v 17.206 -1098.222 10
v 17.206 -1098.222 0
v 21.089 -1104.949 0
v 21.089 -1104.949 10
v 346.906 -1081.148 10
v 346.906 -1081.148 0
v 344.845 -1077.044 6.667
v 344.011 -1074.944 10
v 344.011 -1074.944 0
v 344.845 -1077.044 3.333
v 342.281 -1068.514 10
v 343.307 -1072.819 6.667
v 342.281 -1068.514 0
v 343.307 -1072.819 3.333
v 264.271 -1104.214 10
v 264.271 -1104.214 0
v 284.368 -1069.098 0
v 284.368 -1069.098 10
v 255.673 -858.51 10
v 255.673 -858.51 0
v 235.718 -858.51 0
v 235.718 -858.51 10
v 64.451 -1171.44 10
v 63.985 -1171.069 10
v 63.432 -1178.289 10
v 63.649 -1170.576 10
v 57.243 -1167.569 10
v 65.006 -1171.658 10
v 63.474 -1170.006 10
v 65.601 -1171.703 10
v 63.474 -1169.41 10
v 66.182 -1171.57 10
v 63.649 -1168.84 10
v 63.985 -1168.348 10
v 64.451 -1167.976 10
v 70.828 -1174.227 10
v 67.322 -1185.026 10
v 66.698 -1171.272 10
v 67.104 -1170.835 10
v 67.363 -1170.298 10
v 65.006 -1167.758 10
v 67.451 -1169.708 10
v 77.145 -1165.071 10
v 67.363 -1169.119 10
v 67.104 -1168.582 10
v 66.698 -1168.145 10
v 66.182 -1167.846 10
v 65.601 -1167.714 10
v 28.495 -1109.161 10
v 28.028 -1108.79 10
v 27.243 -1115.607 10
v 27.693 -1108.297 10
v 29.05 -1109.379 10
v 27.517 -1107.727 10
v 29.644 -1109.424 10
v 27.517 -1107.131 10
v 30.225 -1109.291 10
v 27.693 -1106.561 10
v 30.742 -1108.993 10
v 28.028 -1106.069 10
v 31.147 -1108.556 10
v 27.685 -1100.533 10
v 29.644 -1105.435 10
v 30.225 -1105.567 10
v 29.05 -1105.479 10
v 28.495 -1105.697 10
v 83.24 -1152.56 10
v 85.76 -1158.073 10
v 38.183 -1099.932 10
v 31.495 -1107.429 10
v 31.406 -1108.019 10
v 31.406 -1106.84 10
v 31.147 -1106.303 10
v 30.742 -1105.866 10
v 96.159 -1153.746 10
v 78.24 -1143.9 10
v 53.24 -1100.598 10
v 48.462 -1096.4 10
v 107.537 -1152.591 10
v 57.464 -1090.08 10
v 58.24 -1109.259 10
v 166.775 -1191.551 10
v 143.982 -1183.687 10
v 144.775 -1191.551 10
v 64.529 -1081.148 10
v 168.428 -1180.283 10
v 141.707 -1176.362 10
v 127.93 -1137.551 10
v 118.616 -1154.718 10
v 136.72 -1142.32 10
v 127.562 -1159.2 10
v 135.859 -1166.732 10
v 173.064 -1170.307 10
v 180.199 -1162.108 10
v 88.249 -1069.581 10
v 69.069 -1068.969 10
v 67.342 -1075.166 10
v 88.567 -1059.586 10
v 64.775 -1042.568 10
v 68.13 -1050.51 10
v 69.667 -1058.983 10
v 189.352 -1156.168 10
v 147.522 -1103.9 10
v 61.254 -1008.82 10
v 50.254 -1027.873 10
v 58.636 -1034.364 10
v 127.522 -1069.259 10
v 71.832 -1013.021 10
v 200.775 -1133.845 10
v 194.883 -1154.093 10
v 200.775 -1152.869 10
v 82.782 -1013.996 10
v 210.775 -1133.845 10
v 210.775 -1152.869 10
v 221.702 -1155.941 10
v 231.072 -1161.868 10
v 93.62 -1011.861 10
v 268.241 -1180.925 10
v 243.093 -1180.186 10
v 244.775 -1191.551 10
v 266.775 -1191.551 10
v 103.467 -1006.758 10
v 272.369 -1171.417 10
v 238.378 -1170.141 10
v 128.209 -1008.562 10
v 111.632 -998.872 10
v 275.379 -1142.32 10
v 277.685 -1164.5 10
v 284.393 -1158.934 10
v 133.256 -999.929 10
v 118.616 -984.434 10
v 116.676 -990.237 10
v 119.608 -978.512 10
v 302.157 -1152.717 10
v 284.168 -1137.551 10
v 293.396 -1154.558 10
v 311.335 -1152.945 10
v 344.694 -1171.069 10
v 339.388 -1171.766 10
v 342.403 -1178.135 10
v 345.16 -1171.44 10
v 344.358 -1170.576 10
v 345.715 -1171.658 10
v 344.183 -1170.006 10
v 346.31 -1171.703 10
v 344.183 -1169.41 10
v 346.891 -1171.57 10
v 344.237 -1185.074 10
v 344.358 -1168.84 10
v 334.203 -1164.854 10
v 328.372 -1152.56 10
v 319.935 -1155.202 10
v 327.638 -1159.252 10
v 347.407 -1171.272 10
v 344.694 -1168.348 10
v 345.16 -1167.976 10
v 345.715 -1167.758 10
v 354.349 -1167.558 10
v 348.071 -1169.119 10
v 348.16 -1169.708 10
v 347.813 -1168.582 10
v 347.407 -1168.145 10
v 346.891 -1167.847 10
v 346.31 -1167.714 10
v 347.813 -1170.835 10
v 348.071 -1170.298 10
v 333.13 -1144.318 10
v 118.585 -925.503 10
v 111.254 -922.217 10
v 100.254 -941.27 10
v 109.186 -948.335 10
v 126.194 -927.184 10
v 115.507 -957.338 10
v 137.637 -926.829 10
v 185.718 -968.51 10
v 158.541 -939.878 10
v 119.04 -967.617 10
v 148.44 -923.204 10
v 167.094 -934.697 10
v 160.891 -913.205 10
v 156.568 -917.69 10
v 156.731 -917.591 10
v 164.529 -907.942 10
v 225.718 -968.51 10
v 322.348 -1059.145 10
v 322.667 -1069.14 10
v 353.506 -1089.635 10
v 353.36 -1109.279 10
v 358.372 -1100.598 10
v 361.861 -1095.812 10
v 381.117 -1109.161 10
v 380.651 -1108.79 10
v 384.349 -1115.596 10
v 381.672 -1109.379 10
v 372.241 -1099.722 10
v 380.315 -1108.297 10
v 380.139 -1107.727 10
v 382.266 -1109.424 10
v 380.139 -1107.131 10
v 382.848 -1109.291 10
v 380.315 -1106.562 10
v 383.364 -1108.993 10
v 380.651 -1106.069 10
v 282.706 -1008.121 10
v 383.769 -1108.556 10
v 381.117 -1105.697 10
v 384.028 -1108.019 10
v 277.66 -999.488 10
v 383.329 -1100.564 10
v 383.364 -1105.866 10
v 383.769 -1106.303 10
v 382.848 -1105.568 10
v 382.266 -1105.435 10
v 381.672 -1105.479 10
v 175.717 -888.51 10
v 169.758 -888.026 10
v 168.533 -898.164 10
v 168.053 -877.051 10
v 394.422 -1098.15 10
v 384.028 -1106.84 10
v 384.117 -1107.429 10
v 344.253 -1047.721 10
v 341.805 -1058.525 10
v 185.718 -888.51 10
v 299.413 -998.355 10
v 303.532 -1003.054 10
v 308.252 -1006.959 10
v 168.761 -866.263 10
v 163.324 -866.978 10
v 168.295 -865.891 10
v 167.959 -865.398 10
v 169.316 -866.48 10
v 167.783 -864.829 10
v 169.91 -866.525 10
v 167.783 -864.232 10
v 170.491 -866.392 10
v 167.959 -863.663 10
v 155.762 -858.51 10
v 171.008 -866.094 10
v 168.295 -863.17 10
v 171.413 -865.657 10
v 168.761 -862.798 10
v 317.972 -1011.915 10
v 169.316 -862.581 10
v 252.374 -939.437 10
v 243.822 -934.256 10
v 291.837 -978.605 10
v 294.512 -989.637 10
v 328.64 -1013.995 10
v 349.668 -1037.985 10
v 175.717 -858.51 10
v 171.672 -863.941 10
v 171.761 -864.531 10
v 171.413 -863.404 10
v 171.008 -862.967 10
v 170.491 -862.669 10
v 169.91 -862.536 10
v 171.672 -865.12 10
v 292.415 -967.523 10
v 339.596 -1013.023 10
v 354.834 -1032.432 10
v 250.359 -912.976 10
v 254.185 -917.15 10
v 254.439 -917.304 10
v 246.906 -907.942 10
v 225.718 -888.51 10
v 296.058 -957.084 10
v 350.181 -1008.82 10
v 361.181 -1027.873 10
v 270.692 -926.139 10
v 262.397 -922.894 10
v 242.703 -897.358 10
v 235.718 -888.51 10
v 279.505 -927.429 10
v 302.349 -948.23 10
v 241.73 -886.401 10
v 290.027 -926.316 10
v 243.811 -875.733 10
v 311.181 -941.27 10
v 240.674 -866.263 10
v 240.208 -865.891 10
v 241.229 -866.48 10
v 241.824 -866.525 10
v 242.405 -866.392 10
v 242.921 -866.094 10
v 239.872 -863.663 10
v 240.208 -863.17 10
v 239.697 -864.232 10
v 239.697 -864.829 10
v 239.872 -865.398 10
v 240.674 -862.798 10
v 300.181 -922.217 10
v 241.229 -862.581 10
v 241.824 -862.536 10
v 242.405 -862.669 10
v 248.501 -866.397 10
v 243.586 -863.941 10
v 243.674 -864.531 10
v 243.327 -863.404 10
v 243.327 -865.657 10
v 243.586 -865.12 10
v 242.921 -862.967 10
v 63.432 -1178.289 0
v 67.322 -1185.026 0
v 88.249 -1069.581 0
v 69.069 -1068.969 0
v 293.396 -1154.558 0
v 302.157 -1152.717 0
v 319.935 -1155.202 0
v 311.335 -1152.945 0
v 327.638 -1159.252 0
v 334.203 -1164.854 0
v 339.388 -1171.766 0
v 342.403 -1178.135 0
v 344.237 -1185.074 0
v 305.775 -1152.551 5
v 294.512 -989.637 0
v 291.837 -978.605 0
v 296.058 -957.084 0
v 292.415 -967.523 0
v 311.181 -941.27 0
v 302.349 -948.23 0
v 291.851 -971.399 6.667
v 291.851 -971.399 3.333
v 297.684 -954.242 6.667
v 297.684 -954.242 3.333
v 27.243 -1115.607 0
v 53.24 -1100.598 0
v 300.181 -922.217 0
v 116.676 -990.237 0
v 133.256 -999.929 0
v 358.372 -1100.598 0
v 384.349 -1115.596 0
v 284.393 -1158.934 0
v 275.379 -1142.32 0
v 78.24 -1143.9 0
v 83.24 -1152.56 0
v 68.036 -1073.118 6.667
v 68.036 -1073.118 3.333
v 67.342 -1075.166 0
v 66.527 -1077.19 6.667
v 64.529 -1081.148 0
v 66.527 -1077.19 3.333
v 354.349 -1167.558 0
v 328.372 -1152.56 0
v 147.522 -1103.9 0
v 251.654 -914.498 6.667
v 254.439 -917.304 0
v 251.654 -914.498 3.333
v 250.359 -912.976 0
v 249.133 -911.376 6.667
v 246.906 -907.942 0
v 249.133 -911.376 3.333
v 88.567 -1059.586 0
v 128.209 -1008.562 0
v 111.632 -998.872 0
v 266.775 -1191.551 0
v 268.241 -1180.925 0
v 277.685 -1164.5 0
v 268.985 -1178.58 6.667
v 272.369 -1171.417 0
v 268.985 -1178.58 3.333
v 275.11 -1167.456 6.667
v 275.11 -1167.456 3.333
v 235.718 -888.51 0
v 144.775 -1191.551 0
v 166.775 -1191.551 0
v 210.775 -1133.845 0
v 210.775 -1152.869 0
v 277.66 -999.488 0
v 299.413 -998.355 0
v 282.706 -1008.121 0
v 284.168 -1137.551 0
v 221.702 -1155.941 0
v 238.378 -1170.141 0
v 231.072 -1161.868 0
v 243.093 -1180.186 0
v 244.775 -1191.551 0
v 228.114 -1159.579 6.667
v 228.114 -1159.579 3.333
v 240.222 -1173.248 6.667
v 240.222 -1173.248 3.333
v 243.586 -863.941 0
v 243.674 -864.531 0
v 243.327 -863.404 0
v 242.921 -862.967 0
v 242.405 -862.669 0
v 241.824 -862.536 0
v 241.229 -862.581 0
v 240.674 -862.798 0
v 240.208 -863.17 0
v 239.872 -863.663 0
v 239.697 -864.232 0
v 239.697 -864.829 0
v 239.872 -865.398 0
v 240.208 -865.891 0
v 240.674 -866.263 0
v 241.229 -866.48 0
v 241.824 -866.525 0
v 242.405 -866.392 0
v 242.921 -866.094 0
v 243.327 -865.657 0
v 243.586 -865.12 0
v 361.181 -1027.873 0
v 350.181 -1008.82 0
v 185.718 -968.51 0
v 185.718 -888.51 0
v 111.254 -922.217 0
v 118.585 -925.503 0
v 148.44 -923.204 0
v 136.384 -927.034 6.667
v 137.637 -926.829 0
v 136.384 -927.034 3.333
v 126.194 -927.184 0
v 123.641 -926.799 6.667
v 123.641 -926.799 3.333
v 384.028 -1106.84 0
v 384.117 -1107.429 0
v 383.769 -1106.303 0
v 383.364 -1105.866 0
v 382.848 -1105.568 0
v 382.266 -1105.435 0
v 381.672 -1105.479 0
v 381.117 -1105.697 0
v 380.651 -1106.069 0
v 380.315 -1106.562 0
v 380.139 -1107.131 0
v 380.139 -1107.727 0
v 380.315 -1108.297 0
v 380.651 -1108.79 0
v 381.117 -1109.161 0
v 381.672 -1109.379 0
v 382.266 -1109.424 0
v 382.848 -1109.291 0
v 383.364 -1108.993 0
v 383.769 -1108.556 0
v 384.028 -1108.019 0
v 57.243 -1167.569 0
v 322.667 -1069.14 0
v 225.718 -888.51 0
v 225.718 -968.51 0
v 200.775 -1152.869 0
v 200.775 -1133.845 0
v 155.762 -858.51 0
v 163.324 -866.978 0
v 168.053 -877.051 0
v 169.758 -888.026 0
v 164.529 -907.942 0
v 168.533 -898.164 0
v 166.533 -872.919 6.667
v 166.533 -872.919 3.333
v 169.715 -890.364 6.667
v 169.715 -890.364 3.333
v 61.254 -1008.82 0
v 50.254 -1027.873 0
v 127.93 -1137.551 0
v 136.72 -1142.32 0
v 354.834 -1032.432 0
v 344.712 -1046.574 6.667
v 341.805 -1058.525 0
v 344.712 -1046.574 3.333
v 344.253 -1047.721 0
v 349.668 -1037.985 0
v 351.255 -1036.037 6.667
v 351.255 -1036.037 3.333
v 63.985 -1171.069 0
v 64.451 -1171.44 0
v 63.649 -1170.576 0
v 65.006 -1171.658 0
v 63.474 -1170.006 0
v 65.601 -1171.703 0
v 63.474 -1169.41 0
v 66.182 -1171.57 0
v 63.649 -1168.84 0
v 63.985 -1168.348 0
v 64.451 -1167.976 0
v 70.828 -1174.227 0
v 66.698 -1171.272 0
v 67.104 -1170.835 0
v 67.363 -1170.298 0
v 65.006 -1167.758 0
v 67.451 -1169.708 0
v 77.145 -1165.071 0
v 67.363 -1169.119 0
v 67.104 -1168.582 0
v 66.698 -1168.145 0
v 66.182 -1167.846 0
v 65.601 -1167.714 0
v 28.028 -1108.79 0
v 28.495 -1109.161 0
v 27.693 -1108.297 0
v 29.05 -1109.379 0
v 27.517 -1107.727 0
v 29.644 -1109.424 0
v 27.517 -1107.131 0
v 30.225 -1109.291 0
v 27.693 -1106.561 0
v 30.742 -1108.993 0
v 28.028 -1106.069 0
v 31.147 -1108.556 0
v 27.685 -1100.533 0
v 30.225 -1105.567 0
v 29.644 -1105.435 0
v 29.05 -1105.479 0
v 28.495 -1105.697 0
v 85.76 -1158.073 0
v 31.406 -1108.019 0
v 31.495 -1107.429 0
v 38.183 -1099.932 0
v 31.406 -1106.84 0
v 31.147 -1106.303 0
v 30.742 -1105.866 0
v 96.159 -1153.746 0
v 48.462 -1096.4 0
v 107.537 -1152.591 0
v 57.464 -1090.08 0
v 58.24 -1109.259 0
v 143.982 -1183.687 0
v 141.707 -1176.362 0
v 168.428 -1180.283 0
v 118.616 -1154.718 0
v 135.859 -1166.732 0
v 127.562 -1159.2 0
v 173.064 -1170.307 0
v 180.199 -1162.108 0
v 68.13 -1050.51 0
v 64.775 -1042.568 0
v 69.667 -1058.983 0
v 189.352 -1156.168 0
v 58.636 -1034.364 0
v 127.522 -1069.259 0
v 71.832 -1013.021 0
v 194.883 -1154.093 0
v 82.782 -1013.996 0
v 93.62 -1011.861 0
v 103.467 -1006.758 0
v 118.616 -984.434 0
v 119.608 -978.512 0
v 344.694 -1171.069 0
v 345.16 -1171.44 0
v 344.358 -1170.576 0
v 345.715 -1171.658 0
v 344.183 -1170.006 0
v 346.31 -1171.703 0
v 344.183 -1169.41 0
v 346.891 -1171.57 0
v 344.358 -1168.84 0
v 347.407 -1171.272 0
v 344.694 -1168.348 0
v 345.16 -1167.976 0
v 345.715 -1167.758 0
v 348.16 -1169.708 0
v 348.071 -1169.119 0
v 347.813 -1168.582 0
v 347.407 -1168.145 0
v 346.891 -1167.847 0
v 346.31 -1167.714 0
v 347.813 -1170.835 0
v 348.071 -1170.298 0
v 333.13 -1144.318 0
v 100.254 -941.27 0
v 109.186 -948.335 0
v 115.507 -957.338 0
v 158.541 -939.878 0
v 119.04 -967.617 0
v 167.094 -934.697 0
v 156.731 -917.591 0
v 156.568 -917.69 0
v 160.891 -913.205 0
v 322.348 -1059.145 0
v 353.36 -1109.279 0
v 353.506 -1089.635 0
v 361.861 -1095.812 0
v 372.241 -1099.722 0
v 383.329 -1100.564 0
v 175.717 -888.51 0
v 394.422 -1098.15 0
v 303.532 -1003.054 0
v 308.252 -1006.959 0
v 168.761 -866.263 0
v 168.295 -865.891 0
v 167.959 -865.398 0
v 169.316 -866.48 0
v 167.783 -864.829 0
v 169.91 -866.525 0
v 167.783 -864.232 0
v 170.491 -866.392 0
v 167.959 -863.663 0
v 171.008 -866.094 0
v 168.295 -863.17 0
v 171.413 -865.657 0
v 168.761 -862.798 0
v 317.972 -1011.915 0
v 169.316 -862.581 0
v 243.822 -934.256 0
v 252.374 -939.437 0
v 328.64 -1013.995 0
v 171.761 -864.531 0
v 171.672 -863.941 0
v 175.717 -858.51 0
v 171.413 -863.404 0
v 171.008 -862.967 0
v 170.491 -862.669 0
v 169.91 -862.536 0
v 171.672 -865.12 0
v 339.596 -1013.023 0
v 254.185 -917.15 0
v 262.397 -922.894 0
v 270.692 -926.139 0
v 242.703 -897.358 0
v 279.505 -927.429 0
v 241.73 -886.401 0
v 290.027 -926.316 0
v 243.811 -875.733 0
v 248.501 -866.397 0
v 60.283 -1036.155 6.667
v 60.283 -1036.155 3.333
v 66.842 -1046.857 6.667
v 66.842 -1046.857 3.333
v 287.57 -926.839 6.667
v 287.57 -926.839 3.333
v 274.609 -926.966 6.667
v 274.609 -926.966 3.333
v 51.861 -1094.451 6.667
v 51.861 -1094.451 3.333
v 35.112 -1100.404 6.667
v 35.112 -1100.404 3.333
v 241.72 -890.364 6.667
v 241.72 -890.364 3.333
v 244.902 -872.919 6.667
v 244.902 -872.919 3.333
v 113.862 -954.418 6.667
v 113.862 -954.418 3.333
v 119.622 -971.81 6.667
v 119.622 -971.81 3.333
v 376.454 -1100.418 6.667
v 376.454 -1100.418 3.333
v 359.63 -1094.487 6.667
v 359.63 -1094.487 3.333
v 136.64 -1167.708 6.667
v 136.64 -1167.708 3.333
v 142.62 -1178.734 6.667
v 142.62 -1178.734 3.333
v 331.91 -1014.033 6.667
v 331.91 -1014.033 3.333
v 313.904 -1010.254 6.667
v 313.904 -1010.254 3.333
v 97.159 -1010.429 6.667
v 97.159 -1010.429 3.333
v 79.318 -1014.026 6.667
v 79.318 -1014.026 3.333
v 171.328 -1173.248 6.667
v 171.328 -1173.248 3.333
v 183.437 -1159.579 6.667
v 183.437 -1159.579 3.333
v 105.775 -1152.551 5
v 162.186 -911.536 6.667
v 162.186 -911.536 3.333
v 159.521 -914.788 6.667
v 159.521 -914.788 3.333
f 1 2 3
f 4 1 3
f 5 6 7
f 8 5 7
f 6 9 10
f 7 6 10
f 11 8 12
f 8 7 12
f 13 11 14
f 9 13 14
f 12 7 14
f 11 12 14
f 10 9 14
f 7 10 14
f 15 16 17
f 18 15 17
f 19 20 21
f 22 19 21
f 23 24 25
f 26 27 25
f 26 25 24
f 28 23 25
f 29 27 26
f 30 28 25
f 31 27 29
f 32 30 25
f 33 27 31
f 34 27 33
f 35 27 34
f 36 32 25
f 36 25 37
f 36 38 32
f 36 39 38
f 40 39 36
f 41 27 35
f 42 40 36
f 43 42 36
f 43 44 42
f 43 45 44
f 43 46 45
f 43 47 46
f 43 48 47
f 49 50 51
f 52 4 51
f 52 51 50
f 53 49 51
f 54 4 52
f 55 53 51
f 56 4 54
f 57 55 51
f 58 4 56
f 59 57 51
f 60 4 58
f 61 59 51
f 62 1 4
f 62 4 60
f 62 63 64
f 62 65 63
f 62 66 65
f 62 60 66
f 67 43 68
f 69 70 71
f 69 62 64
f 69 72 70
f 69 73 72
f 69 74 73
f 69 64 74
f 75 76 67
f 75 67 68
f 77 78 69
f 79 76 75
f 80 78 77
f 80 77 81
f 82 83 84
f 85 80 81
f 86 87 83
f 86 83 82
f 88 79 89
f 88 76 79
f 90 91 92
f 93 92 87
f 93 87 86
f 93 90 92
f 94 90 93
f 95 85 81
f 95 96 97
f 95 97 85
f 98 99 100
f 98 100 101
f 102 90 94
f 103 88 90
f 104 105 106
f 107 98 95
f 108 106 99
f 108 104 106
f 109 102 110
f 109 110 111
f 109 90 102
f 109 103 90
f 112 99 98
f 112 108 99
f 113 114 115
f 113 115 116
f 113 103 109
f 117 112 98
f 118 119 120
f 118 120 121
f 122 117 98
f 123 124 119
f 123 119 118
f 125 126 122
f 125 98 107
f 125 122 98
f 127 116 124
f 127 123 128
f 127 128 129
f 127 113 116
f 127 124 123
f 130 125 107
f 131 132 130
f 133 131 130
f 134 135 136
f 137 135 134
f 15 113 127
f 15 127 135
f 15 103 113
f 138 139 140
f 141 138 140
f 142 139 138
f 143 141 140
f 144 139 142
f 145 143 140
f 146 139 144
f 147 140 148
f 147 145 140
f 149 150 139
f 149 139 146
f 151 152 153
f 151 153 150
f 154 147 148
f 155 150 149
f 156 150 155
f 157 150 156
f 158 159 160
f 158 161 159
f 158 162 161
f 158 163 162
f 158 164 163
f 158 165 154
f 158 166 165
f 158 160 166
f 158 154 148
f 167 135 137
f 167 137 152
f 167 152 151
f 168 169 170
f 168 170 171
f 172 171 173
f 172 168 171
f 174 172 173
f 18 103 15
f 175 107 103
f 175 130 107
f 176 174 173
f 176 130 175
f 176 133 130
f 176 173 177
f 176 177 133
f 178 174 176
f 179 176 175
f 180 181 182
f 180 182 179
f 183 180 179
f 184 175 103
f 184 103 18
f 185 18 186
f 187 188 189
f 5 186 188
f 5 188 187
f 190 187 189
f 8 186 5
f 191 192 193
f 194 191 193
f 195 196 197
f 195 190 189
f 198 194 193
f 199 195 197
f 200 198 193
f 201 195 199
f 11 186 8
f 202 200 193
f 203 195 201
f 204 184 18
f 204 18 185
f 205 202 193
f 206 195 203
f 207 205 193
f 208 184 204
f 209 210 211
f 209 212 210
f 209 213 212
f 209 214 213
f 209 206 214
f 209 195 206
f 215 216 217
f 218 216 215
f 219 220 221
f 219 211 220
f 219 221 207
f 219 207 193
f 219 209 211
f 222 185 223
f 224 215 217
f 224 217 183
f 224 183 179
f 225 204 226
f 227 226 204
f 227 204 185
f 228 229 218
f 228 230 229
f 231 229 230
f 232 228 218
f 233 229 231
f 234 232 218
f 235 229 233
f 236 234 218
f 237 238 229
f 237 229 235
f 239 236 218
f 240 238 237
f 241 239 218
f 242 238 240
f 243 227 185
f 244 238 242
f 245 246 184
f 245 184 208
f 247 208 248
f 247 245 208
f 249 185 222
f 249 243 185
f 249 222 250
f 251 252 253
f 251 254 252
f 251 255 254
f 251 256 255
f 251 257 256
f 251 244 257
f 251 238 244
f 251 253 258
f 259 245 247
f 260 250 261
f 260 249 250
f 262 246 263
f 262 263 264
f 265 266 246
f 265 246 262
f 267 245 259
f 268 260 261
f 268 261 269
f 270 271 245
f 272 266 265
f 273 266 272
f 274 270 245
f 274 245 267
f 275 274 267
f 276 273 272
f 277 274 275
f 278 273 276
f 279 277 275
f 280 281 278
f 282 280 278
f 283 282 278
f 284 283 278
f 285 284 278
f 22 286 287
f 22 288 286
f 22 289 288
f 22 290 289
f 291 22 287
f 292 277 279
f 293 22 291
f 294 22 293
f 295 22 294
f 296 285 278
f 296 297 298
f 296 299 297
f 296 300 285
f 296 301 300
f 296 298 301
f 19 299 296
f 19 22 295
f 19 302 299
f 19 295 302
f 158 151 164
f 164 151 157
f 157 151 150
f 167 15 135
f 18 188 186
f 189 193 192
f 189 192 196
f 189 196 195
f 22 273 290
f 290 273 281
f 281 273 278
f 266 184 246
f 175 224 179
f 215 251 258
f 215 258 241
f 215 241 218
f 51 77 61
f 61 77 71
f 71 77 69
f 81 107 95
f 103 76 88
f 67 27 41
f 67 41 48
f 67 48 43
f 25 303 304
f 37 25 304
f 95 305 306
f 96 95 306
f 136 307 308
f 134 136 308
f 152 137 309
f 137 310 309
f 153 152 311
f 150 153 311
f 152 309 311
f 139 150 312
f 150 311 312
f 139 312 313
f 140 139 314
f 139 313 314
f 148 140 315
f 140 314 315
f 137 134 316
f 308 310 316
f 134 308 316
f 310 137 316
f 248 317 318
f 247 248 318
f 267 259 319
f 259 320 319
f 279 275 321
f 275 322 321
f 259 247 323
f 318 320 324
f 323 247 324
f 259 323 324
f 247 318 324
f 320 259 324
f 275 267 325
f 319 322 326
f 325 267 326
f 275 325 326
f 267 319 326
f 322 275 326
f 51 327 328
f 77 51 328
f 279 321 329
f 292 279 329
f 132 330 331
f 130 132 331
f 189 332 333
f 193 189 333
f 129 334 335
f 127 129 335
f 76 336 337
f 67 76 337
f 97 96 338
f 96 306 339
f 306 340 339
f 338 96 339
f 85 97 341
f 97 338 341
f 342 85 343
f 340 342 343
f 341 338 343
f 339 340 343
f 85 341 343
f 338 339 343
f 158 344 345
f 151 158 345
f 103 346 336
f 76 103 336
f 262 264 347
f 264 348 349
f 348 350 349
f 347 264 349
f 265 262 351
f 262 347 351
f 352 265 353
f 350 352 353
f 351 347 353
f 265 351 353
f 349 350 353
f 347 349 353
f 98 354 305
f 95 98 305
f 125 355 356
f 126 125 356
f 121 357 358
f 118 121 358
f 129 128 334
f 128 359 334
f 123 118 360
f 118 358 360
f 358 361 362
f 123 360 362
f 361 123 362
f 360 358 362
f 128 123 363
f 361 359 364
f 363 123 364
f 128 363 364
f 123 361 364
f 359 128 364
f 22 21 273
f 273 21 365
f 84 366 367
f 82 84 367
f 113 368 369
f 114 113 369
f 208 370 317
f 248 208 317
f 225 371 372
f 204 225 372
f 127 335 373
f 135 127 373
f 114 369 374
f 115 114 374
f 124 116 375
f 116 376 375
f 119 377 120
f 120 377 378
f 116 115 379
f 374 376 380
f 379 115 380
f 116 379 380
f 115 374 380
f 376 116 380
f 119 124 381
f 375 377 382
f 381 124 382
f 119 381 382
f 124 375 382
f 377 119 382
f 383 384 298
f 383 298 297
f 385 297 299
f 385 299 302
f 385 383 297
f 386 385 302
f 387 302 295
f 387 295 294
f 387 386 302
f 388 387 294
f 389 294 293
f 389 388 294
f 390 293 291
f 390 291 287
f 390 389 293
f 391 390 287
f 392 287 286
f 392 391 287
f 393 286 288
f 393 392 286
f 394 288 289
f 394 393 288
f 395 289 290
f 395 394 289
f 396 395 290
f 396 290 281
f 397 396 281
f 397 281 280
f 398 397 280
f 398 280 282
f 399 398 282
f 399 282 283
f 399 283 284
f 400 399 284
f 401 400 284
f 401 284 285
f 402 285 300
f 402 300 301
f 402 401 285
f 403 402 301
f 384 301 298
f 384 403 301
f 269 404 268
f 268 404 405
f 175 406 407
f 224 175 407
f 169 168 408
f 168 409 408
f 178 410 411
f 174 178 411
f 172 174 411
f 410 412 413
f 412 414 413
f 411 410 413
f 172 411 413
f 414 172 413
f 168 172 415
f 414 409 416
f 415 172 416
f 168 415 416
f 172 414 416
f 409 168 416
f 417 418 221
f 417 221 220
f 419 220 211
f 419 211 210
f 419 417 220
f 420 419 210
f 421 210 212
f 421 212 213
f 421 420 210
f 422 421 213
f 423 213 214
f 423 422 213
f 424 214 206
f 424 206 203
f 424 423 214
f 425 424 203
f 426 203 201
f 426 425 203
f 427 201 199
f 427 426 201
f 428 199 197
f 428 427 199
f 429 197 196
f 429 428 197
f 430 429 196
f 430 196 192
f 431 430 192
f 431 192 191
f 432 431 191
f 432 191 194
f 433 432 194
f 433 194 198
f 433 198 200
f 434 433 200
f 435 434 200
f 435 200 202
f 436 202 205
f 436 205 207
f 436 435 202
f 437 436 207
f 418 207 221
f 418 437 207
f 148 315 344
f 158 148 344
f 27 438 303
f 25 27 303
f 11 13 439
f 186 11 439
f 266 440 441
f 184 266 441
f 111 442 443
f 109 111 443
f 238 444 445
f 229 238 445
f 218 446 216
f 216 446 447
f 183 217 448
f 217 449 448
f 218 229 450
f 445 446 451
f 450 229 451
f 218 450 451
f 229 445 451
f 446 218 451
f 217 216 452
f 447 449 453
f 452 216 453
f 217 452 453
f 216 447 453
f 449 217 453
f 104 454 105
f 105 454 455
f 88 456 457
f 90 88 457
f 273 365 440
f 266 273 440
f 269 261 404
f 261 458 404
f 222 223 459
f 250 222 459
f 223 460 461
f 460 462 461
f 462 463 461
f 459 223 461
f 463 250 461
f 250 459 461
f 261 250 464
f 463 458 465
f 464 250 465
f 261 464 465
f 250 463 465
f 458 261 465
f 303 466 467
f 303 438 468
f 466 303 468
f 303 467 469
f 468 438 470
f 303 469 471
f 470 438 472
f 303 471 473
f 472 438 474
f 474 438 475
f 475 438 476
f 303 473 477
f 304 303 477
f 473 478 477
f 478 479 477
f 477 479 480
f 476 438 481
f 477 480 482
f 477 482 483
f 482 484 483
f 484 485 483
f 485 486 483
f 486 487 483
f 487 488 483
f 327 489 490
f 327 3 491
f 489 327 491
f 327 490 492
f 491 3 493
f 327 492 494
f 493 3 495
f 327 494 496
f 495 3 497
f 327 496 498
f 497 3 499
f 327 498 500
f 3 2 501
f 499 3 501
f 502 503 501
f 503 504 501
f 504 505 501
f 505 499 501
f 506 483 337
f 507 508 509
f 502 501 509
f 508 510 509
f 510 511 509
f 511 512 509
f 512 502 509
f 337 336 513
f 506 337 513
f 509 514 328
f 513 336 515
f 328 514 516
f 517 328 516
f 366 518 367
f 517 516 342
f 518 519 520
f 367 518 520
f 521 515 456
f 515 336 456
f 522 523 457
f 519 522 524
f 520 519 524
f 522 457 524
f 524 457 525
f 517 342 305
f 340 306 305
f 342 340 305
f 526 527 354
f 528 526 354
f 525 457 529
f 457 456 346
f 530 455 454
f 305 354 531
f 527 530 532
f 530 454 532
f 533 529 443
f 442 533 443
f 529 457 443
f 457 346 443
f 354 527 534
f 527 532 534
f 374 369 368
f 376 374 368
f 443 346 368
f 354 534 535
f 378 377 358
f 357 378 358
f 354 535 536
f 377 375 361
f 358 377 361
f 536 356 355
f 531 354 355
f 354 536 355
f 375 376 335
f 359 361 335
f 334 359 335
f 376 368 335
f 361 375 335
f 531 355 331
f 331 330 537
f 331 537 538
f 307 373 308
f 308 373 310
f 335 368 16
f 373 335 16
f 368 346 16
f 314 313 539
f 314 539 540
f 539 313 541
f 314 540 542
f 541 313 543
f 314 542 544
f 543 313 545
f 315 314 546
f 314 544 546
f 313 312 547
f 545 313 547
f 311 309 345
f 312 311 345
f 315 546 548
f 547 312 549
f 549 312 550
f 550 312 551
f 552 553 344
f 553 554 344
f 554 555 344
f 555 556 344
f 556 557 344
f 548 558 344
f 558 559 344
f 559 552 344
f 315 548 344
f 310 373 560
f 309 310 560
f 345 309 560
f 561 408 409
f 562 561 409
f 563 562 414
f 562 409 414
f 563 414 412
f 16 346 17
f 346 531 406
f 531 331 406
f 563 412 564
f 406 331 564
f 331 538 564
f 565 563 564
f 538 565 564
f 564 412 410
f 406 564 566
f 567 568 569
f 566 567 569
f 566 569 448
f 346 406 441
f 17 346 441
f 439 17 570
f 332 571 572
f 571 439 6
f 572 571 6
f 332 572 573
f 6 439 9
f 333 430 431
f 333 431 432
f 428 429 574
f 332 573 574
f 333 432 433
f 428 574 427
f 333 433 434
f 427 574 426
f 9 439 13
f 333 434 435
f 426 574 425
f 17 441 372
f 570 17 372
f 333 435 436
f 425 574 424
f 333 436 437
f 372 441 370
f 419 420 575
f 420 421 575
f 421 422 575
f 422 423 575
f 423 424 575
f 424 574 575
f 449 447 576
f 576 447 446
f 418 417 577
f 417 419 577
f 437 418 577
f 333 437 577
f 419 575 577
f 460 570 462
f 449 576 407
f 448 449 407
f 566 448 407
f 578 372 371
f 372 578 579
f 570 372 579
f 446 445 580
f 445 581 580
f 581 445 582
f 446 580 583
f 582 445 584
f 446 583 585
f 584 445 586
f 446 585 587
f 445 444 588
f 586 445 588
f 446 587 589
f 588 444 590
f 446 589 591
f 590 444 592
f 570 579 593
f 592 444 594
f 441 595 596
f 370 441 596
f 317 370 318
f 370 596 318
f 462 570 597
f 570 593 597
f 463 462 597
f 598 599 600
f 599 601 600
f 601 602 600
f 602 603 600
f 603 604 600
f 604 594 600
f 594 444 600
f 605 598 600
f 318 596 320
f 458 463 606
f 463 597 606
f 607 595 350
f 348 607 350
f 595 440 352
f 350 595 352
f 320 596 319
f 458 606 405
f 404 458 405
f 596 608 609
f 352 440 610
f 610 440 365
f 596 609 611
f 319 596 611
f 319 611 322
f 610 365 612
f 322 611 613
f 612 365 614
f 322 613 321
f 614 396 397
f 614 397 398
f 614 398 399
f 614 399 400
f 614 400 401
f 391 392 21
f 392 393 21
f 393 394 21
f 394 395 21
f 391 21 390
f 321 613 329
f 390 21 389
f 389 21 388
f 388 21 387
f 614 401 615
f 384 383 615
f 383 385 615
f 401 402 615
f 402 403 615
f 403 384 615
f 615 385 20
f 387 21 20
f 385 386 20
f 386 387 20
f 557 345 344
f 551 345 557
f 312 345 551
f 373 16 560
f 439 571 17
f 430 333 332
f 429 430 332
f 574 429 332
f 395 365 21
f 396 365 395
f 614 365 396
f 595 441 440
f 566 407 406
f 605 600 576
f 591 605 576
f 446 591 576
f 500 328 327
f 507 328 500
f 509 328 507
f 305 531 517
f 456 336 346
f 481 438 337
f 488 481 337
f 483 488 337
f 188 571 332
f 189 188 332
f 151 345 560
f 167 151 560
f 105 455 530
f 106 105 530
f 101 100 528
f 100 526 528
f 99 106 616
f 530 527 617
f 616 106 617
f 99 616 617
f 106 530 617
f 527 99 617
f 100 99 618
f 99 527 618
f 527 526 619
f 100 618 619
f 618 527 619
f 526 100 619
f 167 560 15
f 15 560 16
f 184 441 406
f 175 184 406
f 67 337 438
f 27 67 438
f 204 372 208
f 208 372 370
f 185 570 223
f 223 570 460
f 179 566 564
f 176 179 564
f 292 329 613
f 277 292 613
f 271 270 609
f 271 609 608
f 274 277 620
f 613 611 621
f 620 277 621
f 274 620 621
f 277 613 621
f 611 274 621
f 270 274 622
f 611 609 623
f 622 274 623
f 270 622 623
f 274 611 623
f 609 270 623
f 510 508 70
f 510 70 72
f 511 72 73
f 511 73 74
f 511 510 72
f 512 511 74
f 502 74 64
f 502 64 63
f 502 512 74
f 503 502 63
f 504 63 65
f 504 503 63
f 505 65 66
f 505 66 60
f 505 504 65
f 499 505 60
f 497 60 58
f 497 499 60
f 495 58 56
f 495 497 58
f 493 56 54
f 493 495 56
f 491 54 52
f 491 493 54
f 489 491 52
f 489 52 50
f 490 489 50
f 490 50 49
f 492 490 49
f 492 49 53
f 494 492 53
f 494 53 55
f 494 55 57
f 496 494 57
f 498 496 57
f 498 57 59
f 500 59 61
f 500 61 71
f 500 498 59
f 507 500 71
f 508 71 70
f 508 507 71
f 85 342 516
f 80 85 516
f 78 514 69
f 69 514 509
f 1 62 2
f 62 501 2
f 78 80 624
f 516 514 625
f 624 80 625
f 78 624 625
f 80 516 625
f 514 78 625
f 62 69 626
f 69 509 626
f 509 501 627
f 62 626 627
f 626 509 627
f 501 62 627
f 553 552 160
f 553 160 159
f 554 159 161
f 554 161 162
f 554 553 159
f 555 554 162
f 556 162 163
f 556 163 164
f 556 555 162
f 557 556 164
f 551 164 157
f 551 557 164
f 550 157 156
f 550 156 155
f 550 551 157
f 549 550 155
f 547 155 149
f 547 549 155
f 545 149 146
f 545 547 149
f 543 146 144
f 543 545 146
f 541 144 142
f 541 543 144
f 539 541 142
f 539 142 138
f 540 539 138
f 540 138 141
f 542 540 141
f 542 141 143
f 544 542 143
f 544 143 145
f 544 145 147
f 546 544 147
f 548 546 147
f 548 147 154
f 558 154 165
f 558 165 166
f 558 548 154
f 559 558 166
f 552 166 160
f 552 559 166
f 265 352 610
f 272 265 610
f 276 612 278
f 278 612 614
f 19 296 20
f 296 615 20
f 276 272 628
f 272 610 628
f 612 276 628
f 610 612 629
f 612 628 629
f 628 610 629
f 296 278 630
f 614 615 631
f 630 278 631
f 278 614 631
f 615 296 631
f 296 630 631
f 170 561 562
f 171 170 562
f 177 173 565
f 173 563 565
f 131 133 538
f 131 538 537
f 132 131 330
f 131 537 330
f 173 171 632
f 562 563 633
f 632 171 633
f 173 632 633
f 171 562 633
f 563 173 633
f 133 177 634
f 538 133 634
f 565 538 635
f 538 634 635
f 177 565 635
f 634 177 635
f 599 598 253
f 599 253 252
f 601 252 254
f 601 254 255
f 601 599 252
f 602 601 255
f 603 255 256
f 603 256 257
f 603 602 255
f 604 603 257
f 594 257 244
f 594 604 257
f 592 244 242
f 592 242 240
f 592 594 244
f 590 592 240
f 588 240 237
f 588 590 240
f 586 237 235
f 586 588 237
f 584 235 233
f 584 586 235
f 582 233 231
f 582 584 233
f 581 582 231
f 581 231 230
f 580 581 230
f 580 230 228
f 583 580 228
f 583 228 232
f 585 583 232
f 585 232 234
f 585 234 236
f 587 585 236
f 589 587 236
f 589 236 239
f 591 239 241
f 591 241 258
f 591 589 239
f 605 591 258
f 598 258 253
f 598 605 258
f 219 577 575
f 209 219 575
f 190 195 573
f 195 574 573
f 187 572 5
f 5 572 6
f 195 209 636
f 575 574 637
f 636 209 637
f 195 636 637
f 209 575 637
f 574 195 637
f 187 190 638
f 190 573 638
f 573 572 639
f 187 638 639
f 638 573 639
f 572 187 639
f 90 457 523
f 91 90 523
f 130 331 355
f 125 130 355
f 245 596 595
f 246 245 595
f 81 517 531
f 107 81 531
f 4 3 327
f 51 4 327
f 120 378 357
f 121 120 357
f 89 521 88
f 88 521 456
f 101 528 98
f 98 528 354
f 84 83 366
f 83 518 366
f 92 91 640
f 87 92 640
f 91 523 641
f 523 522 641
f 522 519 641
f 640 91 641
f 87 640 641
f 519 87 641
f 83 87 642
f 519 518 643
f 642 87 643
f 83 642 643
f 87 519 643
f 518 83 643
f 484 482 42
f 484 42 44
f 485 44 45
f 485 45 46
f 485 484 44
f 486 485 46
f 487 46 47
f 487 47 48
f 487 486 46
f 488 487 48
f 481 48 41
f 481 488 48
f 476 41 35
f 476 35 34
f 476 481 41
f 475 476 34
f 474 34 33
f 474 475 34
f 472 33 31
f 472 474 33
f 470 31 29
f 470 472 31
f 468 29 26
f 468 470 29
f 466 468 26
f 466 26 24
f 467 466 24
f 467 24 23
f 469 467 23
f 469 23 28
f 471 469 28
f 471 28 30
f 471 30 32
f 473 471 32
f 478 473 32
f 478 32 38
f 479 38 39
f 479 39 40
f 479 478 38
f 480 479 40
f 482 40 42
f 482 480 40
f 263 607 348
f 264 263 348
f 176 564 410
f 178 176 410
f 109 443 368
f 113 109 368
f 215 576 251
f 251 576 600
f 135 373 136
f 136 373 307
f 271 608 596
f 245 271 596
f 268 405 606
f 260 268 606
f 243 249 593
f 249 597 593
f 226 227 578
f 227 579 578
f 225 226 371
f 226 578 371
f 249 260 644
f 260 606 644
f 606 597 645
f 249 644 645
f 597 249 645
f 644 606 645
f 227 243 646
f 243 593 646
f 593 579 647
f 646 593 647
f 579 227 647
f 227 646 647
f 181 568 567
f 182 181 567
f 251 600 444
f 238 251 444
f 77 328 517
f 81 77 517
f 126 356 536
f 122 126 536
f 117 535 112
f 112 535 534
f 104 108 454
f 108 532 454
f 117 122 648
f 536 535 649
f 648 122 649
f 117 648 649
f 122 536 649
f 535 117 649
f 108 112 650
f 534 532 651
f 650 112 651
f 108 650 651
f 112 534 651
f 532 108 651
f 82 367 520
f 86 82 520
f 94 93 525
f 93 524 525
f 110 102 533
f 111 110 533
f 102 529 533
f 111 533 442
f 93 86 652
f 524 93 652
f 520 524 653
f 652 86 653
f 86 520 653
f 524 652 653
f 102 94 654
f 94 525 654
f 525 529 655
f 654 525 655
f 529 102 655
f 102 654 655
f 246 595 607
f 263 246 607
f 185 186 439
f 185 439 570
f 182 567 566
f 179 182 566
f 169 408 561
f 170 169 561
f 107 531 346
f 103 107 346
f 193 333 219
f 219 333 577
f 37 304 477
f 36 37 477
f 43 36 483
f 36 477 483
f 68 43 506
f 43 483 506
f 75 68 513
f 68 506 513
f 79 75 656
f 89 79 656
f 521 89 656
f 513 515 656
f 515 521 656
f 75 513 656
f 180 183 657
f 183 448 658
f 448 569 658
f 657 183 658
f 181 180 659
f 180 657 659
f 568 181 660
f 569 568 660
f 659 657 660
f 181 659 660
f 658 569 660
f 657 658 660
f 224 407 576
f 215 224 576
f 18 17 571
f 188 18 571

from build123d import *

# Parameters (mm, degrees)
MODEL_R            = 2
BOSS_EXTRU_1_DEPTH = 10


with BuildPart() as part:
    # Model → Boss.-Extru.1 (new body)
    with BuildSketch(Plane.XY):
        with BuildLine():
            Line((118.61641531, -1154.71765861), (127.930403211, -1137.550920057))
            Line((127.930403211, -1137.550920057), (136.72004758, -1142.319793484))
            Line((136.72004758, -1142.319793484), (127.561777994, -1159.199598646))
            add(Edge.make_bspline(
                [(127.561777994, -1159.199598646), (137.946329318, -1166.206535292), (144.775197591, -1178.081348795), (144.775197591, -1191.551327637)],
                knots=[5, 5, 5, 5, 6, 6, 6, 6], degree=3))
            Line((144.775197591, -1191.551327637), (166.775232855, -1191.551327637))
            add(Edge.make_bspline(
                [(166.775232855, -1191.551327637), (166.775232855, -1171.706328789), (181.59758393, -1155.323650906), (200.775224717, -1152.869278754)],
                knots=[7, 7, 7, 7, 8, 8, 8, 8], degree=3))
            Line((200.775224717, -1152.869278754), (200.775224717, -1133.844858588))
            Line((200.775224717, -1133.844858588), (210.775303385, -1133.844858588))
            Line((210.775303385, -1133.844858588), (210.775303385, -1152.869278754))
            add(Edge.make_bspline(
                [(210.775303385, -1152.869278754), (229.952944173, -1155.323650906), (244.775295247, -1171.706328789), (244.775295247, -1191.551327637)],
                knots=[11, 11, 11, 11, 12, 12, 12, 12], degree=3))
            Line((244.775295247, -1191.551327637), (266.775330512, -1191.551327637))
            add(Edge.make_bspline(
                [(266.775330512, -1191.551327637), (266.775330512, -1177.908060492), (273.782482476, -1165.903323825), (284.392859809, -1158.933637275)],
                knots=[13, 13, 13, 13, 14, 14, 14, 14], degree=3))
            Line((284.392859809, -1158.933637275), (275.378767469, -1142.319793484))
            Line((275.378767469, -1142.319793484), (284.168411838, -1137.550920057))
            Line((284.168411838, -1137.550920057), (293.396100097, -1154.558495198))
            add(Edge.make_bspline(
                [(293.396100097, -1154.558495198), (297.285612901, -1153.257454888), (301.447805013, -1152.551339504), (305.775189453, -1152.551339504)],
                knots=[17, 17, 17, 17, 18, 18, 18, 18], degree=3))
            add(Edge.make_bspline(
                [(305.775189453, -1152.551339504), (325.107170518, -1152.551339504), (341.150980197, -1166.618095011), (344.236752224, -1185.07381604)],
                knots=[18, 18, 18, 18, 19, 19, 19, 19], degree=3))
            Line((344.236752224, -1185.07381604), (354.349485514, -1167.558003187))
            Line((354.349485514, -1167.558003187), (328.371915256, -1152.559823052))
            Line((328.371915256, -1152.559823052), (333.130108886, -1144.318293375))
            Line((333.130108886, -1144.318293375), (264.271435112, -1104.214281331))
            Line((264.271435112, -1104.214281331), (284.368399631, -1069.09782015))
            Line((284.368399631, -1069.09782015), (353.359881836, -1109.279260715))
            Line((353.359881836, -1109.279260715), (358.371806749, -1100.598309109))
            Line((358.371806749, -1100.598309109), (384.349377007, -1115.59644618))
            Line((384.349377007, -1115.59644618), (394.422147189, -1098.149707492))
            add(Edge.make_bspline(
                [(394.422147189, -1098.149707492), (376.868524414, -1104.781903876), (356.593965223, -1097.927843343), (346.905839952, -1081.147558377)],
                knots=[28, 28, 28, 28, 29, 29, 29, 29], degree=3))
            add(Edge.make_bspline(
                [(346.905839952, -1081.147558377), (344.579194715, -1077.117744059), (343.055256727, -1072.845136637), (342.281143771, -1068.514393229)],
                knots=[29, 29, 29, 29, 30, 30, 30, 30], degree=3))
            Line((342.281143771, -1068.514393229), (322.666837131, -1069.139591932))
            Line((322.666837131, -1069.139591932), (322.348338053, -1059.144680908))
            Line((322.348338053, -1059.144680908), (341.805376085, -1058.524520657))
            add(Edge.make_bspline(
                [(341.805376085, -1058.524520657), (342.807554362, -1046.186987766), (349.649858507, -1034.529990424), (361.180765353, -1027.872601779)],
                knots=[33, 33, 33, 33, 34, 34, 34, 34], degree=3))
            Line((361.180765353, -1027.872601779), (350.180747721, -1008.820017958))
            add(Edge.make_bspline(
                [(350.180747721, -1008.820017958), (332.861563693, -1018.819235351), (311.063066514, -1014.022628906), (299.412959364, -998.355368164)],
                knots=[35, 35, 35, 35, 36, 36, 36, 36], degree=3))
            Line((299.412959364, -998.355368164), (282.706313313, -1008.121137275))
            Line((282.706313313, -1008.121137275), (277.659765191, -999.487900241))
            Line((277.659765191, -999.487900241), (294.51179427, -989.637209527))
            add(Edge.make_bspline(
                [(294.51179427, -989.637209527), (287.327047634, -971.892340888), (294.128699652, -951.115099202), (311.18088878, -941.270049832)],
                knots=[39, 39, 39, 39, 40, 40, 40, 40], degree=3))
            Line((311.18088878, -941.270049832), (300.180871148, -922.21746601))
            add(Edge.make_bspline(
                [(300.180871148, -922.21746601), (288.111668131, -929.185602268), (273.867231825, -928.967097086), (262.397130913, -922.893738254)],
                knots=[43, 43, 43, 43, 44, 44, 44, 44], degree=3))
            Line((262.397130913, -922.893738254), (252.374314615, -939.437259033))
            Line((252.374314615, -939.437259033), (243.821520562, -934.25557704))
            Line((243.821520562, -934.25557704), (254.184884548, -917.149988932))
            Line((254.184884548, -917.149988932), (254.43896034, -917.303898573))
            add(Edge.make_bspline(
                [(254.43896034, -917.303898573), (251.531472005, -914.659098768), (248.976244683, -911.528368245), (246.90591455, -907.942454481)],
                knots=[48, 48, 48, 48, 49, 49, 49, 49], degree=3))
            add(Edge.make_bspline(
                [(246.90591455, -907.942454481), (237.277044921, -891.265005615), (241.367579047, -870.433288357), (255.673338053, -858.509899007)],
                knots=[49, 49, 49, 49, 50, 50, 50, 50], degree=3))
            Line((255.673338053, -858.509899007), (247.962525336, -858.509899007))
            Line((247.962525336, -858.509899007), (235.71762245, -858.509899007))
            Line((235.71762245, -858.509899007), (235.71762245, -888.509876627))
            Line((235.71762245, -888.509876627), (225.717543782, -888.509876627))
            Line((225.717543782, -888.509876627), (225.717543782, -968.509903076))
            Line((225.717543782, -968.509903076), (185.717573622, -968.509903076))
            Line((185.717573622, -968.509903076), (185.717573622, -888.509876627))
            Line((185.717573622, -888.509876627), (175.717494954, -888.509876627))
            Line((175.717494954, -888.509876627), (175.717494954, -858.509899007))
            Line((175.717494954, -858.509899007), (163.472592068, -858.509899007))
            Line((163.472592068, -858.509899007), (155.761779351, -858.509899007))
            add(Edge.make_bspline(
                [(155.761779351, -858.509899007), (170.067538357, -870.433288357), (174.158072482, -891.265005615), (164.529202853, -907.942454481)],
                knots=[61, 61, 61, 61, 62, 62, 62, 62], degree=3))
            add(Edge.make_bspline(
                [(164.529202853, -907.942454481), (162.357759168, -911.703723605), (159.653531467, -914.965540012), (156.568103949, -917.689577013)],
                knots=[62, 62, 62, 62, 63, 63, 63, 63], degree=3))
            Line((156.568103949, -917.689577013), (156.730884711, -917.590961154))
            Line((156.730884711, -917.590961154), (167.094248697, -934.696549262))
            Line((167.094248697, -934.696549262), (158.541454644, -939.878231255))
            Line((158.541454644, -939.878231255), (148.439573405, -923.204399739))
            add(Edge.make_bspline(
                [(148.439573405, -923.204399739), (137.075236924, -928.972781494), (123.114504231, -929.064937798), (111.254246256, -922.21746601)],
                knots=[67, 67, 67, 67, 68, 68, 68, 68], degree=3))
            Line((111.254246256, -922.21746601), (100.254228624, -941.270049832))
            add(Edge.make_bspline(
                [(100.254228624, -941.270049832), (117.498998589, -951.226203532), (124.261721028, -972.363070122), (116.675965277, -990.237259033)],
                knots=[71, 71, 71, 71, 72, 72, 72, 72], degree=3))
            Line((116.675965277, -990.237259033), (133.255831814, -999.928872463))
            Line((133.255831814, -999.928872463), (128.209283691, -1008.562109497))
            Line((128.209283691, -1008.562109497), (111.632173231, -998.872089423))
            add(Edge.make_bspline(
                [(111.632173231, -998.872089423), (99.89077105, -1014.127489), (78.381834147, -1018.708604723), (61.254197428, -1008.819974894)],
                knots=[75, 75, 75, 75, 76, 76, 76, 76], degree=3))
            Line((61.254197428, -1008.819974894), (50.254179796, -1027.872558716))
            add(Edge.make_bspline(
                [(50.254179796, -1027.872558716), (61.92823036, -1034.612500461), (68.798784288, -1046.476375786), (69.666603841, -1058.983192057)],
                knots=[79, 79, 79, 79, 80, 80, 80, 80], degree=3))
            Line((69.666603841, -1058.983192057), (88.567431206, -1059.58565313))
            Line((88.567431206, -1059.58565313), (88.248759874, -1069.580564155))
            Line((88.248759874, -1069.580564155), (69.068879774, -1068.969231961))
            add(Edge.make_bspline(
                [(69.068879774, -1068.969231961), (68.270995659, -1073.144084798), (66.77444618, -1077.258906847), (64.529277452, -1081.147558377)],
                knots=[83, 83, 83, 83, 84, 84, 84, 84], degree=3))
            add(Edge.make_bspline(
                [(64.529277452, -1081.147558377), (54.876636664, -1097.866434516), (34.714904351, -1104.731734673), (17.205723307, -1098.222140625)],
                knots=[84, 84, 84, 84, 85, 85, 85, 85], degree=3))
            Line((17.205723307, -1098.222140625), (21.089379448, -1104.948818752))
            Line((21.089379448, -1104.948818752), (27.24318126, -1115.607384359))
            Line((27.24318126, -1115.607384359), (53.239699544, -1100.598309109))
            Line((53.239699544, -1100.598309109), (58.239566623, -1109.258590142))
            Line((58.239566623, -1109.258590142), (127.521642632, -1069.258576918))
            Line((127.521642632, -1069.258576918), (147.521627712, -1103.899571859))
            Line((147.521627712, -1103.899571859), (78.239551703, -1143.899628146))
            Line((78.239551703, -1143.899628146), (83.239591037, -1152.559823052))
            Line((83.239591037, -1152.559823052), (57.243245008, -1167.568898302))
            Line((57.243245008, -1167.568898302), (63.432359049, -1178.288829671))
            Line((63.432359049, -1178.288829671), (67.321699598, -1185.02567083))
            add(Edge.make_bspline(
                [(67.321699598, -1185.02567083), (70.427280924, -1166.593634833), (86.460066297, -1152.551339504), (105.775166395, -1152.551339504)],
                knots=[0, 0, 0, 0, 1, 1, 1, 1], degree=3))
            add(Edge.make_bspline(
                [(105.775166395, -1152.551339504), (110.274633355, -1152.551339504), (114.594955349, -1153.315763129), (118.61641531, -1154.71765861)],
                knots=[1, 1, 1, 1, 2, 2, 2, 2], degree=3))
        make_face()
        with Locations((65.451386675, -1169.708192825)):
            Circle(MODEL_R, mode=Mode.SUBTRACT)
        with Locations((29.494548276, -1107.429239443)):
            Circle(MODEL_R, mode=Mode.SUBTRACT)
        with Locations((169.760752604, -864.530547878)):
            Circle(MODEL_R, mode=Mode.SUBTRACT)
        with Locations((241.6743648, -864.530504815)):
            Circle(MODEL_R, mode=Mode.SUBTRACT)
        with Locations((382.116933599, -1107.429281733)):
            Circle(MODEL_R, mode=Mode.SUBTRACT)
        with Locations((346.16022151, -1169.708251653)):
            Circle(MODEL_R, mode=Mode.SUBTRACT)
    extrude(amount=BOSS_EXTRU_1_DEPTH)


solid = part.part
